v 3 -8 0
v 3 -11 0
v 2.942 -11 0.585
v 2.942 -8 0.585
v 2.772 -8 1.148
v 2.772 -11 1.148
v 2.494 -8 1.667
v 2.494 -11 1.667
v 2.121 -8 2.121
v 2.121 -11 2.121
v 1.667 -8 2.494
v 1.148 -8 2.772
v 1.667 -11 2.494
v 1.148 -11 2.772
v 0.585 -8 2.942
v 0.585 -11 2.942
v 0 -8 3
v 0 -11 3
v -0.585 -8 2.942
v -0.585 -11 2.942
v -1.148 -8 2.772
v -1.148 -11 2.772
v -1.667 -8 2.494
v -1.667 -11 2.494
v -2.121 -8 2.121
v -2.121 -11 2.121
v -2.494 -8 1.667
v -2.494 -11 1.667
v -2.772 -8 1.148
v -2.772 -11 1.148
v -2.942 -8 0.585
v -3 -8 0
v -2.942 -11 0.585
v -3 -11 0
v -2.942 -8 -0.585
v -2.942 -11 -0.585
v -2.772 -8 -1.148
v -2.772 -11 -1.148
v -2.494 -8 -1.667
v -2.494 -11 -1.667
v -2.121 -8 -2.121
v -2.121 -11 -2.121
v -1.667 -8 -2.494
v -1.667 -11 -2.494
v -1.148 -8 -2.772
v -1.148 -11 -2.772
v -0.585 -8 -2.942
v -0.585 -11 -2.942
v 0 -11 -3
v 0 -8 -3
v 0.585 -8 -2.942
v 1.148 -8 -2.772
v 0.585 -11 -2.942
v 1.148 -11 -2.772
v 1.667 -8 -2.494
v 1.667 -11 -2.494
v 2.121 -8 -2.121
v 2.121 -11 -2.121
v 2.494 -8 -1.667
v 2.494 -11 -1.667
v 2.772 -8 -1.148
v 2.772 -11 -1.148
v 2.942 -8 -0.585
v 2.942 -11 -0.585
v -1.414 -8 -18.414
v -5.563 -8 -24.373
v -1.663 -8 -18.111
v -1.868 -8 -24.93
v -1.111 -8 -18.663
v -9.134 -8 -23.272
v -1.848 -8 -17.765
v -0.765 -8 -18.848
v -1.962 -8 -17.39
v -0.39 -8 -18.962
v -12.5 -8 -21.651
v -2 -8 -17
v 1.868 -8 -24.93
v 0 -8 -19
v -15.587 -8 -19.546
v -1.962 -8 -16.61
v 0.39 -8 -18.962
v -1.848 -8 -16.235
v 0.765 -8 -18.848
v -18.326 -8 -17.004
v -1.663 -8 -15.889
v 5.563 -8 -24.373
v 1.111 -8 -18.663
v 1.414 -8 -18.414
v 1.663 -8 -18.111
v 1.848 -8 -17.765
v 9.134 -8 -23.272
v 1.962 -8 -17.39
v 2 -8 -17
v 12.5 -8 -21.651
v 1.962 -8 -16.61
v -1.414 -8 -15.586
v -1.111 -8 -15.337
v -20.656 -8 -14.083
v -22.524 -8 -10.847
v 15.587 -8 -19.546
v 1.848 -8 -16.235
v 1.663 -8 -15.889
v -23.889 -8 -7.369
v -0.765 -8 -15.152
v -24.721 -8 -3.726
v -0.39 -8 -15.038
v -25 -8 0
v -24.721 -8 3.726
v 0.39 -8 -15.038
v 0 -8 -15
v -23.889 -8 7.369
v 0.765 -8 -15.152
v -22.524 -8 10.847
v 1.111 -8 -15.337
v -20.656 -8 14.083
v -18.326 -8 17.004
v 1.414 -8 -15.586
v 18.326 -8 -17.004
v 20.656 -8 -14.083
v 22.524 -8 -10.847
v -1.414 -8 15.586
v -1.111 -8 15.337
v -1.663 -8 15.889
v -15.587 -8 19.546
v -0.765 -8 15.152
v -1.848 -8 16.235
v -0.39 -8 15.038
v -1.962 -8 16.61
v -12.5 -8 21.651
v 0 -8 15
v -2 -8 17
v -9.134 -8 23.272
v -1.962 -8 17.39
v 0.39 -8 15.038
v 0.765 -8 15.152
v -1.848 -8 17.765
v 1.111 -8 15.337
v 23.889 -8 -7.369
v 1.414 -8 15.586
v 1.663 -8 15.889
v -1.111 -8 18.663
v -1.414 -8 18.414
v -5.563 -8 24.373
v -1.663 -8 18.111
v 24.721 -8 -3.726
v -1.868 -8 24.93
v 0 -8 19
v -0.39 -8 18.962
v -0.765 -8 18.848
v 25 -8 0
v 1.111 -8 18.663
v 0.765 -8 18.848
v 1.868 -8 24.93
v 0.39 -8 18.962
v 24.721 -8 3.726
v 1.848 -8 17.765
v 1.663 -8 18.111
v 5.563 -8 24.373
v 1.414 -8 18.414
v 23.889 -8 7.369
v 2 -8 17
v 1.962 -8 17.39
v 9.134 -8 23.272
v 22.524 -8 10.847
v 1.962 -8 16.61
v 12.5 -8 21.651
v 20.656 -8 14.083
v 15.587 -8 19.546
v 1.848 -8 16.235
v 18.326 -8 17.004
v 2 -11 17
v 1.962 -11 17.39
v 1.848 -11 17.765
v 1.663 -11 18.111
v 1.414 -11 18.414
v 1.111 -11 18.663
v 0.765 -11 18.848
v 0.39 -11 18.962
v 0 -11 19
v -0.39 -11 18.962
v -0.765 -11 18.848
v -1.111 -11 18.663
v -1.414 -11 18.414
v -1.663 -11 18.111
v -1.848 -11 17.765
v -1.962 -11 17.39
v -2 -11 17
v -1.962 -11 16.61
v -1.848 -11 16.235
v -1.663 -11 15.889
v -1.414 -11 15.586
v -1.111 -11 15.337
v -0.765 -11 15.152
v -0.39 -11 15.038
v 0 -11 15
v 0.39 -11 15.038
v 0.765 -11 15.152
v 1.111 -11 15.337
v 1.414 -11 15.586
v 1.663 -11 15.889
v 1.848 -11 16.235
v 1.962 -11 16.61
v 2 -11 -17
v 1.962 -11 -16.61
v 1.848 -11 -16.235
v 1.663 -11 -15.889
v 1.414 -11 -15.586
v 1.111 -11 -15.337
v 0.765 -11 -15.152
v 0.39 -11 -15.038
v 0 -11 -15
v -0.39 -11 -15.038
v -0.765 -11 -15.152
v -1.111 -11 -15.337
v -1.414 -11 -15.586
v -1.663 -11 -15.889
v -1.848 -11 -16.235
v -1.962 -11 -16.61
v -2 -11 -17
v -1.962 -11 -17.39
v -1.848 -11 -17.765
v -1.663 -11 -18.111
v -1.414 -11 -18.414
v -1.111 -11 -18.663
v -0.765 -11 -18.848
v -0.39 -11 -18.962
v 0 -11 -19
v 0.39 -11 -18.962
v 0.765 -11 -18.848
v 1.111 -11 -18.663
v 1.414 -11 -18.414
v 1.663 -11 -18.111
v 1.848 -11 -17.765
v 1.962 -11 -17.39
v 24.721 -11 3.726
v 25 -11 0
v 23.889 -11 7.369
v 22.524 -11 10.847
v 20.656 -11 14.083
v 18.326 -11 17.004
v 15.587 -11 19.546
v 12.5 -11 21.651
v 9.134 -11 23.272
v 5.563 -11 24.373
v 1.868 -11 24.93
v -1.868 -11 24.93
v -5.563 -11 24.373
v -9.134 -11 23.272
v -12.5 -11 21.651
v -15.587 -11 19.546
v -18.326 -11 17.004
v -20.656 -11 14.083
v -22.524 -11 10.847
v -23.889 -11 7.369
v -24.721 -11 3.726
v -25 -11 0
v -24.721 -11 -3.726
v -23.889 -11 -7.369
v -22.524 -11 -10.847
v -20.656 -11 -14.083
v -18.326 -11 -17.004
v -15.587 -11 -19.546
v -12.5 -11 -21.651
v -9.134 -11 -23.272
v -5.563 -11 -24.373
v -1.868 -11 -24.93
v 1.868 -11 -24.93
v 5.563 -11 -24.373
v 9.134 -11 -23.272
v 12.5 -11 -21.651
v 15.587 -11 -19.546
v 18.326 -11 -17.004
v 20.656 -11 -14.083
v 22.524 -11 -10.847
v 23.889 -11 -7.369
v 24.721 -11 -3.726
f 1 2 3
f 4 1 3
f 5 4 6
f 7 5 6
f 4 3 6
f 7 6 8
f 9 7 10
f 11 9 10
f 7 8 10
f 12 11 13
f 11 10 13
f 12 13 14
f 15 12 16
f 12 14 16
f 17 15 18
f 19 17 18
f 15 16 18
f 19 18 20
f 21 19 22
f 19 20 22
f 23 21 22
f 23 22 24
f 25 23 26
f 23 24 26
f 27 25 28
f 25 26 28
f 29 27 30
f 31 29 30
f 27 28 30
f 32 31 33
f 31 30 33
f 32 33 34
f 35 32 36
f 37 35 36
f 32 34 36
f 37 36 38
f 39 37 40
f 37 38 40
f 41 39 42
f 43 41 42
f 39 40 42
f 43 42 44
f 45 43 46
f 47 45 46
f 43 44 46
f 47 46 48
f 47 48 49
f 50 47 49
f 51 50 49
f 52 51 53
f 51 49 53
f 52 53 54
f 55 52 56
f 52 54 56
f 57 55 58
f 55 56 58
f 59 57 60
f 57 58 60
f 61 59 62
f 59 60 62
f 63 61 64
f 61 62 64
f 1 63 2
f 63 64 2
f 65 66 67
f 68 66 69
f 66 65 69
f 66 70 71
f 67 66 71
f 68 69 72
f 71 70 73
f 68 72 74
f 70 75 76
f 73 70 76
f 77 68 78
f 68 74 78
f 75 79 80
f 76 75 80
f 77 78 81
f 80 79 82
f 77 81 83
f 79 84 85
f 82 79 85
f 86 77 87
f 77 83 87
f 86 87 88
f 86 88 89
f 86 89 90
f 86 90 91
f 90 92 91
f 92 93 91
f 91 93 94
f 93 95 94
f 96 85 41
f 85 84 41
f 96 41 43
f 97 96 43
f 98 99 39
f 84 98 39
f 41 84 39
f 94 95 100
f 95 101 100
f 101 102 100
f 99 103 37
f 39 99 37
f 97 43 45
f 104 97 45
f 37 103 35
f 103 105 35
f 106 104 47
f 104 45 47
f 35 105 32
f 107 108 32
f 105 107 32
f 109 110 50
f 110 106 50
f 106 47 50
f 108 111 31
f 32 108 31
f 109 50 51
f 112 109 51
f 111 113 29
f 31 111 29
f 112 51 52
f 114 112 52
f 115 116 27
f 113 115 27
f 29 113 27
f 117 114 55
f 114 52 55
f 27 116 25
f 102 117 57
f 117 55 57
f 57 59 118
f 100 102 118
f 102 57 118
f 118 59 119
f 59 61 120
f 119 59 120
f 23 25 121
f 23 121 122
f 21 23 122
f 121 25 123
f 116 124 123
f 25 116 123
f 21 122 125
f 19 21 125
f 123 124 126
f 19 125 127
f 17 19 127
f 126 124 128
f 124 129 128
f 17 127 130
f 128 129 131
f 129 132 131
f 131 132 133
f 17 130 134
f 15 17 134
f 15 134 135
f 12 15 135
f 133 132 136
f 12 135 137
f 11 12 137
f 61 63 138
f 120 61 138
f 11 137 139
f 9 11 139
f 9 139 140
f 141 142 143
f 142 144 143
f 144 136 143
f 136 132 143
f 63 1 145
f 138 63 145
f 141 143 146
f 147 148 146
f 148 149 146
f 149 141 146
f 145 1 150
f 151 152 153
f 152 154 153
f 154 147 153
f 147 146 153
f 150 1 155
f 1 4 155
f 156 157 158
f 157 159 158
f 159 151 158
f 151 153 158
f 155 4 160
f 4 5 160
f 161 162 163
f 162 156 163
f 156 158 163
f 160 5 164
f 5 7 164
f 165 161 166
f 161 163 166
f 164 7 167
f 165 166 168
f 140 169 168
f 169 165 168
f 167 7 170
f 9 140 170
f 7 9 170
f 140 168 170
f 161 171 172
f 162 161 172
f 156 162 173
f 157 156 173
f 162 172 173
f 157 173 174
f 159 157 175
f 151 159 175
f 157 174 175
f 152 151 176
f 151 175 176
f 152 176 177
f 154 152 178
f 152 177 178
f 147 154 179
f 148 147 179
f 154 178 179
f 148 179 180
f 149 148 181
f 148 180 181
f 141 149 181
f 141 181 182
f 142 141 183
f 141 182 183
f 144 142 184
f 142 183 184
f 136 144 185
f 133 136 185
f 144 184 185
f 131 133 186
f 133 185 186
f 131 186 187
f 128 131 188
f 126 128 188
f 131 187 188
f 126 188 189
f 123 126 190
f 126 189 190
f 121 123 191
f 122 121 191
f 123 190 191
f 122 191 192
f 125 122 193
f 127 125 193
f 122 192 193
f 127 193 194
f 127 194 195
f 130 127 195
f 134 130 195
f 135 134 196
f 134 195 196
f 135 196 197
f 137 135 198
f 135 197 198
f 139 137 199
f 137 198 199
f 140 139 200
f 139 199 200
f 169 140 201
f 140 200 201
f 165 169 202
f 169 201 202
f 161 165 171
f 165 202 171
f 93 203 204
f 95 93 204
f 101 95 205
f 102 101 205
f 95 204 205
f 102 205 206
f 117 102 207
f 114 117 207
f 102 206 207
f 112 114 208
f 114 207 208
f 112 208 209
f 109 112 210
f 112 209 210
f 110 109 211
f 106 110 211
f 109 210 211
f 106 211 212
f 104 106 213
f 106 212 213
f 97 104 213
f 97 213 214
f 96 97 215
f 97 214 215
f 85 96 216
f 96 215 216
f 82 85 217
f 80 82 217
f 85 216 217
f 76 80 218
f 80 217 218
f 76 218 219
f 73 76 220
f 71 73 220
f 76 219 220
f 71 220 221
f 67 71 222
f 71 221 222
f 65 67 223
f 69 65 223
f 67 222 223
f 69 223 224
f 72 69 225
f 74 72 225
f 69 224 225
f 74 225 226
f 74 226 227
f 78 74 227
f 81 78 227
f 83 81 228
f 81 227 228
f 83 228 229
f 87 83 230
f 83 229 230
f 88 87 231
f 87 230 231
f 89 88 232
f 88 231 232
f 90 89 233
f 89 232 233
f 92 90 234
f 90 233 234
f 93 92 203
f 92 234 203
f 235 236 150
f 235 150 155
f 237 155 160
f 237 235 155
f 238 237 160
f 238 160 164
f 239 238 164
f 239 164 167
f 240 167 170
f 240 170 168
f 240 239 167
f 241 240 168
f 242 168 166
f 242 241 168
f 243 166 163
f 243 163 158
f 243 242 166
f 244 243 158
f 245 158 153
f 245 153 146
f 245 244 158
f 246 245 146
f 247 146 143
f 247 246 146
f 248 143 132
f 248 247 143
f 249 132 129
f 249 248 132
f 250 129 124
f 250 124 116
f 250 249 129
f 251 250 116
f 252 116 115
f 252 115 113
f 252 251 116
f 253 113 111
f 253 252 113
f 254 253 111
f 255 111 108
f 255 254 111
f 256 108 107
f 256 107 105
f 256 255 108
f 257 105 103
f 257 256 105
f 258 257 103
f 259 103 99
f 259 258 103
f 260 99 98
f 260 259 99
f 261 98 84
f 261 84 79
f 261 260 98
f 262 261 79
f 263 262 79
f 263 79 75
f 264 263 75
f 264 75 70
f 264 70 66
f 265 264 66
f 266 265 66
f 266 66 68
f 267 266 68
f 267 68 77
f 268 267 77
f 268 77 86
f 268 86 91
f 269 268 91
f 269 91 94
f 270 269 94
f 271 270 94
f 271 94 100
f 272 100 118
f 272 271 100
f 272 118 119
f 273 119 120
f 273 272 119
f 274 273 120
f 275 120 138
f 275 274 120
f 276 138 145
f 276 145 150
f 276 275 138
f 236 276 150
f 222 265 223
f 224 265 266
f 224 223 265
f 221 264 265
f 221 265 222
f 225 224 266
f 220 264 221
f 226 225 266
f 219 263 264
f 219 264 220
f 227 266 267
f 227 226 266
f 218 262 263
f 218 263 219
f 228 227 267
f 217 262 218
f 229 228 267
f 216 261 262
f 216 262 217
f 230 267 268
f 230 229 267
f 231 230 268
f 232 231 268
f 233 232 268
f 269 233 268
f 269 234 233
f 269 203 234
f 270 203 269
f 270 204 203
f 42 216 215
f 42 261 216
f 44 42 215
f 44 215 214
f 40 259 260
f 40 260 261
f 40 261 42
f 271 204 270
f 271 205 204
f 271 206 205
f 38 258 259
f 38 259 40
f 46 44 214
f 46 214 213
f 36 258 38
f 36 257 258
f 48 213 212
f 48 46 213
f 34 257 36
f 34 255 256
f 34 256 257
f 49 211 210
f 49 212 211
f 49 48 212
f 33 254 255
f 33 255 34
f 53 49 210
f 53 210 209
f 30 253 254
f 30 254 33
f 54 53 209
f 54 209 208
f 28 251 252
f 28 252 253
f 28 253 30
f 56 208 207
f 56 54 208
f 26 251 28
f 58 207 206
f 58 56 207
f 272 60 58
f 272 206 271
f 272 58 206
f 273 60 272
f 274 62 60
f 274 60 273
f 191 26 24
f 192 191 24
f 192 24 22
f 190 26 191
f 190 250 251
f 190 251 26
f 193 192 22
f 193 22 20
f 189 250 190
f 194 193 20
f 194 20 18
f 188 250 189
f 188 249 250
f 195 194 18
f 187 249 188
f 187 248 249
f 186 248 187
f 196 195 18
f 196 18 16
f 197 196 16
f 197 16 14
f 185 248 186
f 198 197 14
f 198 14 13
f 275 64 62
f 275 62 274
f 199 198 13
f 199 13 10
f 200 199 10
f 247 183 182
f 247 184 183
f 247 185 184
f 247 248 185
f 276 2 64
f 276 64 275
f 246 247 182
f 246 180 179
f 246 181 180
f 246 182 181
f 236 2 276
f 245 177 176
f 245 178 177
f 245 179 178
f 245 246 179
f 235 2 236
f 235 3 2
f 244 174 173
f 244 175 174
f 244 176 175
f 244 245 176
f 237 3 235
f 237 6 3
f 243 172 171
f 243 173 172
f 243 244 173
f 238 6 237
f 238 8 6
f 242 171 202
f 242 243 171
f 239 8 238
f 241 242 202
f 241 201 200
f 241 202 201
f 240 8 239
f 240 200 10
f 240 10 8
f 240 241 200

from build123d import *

# Parameters (mm, degrees)
SKETCH_AS_DRAWN_R              = 25
SKETCH_AS_DRAWN_R_2            = 3
SKETCH_AS_DRAWN_R_3            = 2
EXTRUDE_DEPTH                  = 3
EXTRUDE_ONTO_SKETCH_ROLL_ANGLE = 90


with BuildPart() as part:
    # Sketch as drawn → Extrude (new)
    with BuildSketch(Plane.XY):
        Circle(SKETCH_AS_DRAWN_R)
        Circle(SKETCH_AS_DRAWN_R_2, mode=Mode.SUBTRACT)
        with Locations((0, 17)):
            Circle(SKETCH_AS_DRAWN_R_3, mode=Mode.SUBTRACT)
        with Locations((0, -17)):
            Circle(SKETCH_AS_DRAWN_R_3, mode=Mode.SUBTRACT)
    extrude(amount=-EXTRUDE_DEPTH)


with BuildPart() as part_1:
    # Extrude onto Sketch roll: moved
    add(part.part.rotate(Axis((0, 0, 0), (1, 0, 0)), EXTRUDE_ONTO_SKETCH_ROLL_ANGLE))


with BuildPart() as part_2:
    # Extrude onto Sketch placement: moved
    add(part_1.part)


with BuildPart() as part_3:
    # Extrude placement: moved
    add(part_2.part.moved(Location((0, -11, 0))))


solid = part_3.part
